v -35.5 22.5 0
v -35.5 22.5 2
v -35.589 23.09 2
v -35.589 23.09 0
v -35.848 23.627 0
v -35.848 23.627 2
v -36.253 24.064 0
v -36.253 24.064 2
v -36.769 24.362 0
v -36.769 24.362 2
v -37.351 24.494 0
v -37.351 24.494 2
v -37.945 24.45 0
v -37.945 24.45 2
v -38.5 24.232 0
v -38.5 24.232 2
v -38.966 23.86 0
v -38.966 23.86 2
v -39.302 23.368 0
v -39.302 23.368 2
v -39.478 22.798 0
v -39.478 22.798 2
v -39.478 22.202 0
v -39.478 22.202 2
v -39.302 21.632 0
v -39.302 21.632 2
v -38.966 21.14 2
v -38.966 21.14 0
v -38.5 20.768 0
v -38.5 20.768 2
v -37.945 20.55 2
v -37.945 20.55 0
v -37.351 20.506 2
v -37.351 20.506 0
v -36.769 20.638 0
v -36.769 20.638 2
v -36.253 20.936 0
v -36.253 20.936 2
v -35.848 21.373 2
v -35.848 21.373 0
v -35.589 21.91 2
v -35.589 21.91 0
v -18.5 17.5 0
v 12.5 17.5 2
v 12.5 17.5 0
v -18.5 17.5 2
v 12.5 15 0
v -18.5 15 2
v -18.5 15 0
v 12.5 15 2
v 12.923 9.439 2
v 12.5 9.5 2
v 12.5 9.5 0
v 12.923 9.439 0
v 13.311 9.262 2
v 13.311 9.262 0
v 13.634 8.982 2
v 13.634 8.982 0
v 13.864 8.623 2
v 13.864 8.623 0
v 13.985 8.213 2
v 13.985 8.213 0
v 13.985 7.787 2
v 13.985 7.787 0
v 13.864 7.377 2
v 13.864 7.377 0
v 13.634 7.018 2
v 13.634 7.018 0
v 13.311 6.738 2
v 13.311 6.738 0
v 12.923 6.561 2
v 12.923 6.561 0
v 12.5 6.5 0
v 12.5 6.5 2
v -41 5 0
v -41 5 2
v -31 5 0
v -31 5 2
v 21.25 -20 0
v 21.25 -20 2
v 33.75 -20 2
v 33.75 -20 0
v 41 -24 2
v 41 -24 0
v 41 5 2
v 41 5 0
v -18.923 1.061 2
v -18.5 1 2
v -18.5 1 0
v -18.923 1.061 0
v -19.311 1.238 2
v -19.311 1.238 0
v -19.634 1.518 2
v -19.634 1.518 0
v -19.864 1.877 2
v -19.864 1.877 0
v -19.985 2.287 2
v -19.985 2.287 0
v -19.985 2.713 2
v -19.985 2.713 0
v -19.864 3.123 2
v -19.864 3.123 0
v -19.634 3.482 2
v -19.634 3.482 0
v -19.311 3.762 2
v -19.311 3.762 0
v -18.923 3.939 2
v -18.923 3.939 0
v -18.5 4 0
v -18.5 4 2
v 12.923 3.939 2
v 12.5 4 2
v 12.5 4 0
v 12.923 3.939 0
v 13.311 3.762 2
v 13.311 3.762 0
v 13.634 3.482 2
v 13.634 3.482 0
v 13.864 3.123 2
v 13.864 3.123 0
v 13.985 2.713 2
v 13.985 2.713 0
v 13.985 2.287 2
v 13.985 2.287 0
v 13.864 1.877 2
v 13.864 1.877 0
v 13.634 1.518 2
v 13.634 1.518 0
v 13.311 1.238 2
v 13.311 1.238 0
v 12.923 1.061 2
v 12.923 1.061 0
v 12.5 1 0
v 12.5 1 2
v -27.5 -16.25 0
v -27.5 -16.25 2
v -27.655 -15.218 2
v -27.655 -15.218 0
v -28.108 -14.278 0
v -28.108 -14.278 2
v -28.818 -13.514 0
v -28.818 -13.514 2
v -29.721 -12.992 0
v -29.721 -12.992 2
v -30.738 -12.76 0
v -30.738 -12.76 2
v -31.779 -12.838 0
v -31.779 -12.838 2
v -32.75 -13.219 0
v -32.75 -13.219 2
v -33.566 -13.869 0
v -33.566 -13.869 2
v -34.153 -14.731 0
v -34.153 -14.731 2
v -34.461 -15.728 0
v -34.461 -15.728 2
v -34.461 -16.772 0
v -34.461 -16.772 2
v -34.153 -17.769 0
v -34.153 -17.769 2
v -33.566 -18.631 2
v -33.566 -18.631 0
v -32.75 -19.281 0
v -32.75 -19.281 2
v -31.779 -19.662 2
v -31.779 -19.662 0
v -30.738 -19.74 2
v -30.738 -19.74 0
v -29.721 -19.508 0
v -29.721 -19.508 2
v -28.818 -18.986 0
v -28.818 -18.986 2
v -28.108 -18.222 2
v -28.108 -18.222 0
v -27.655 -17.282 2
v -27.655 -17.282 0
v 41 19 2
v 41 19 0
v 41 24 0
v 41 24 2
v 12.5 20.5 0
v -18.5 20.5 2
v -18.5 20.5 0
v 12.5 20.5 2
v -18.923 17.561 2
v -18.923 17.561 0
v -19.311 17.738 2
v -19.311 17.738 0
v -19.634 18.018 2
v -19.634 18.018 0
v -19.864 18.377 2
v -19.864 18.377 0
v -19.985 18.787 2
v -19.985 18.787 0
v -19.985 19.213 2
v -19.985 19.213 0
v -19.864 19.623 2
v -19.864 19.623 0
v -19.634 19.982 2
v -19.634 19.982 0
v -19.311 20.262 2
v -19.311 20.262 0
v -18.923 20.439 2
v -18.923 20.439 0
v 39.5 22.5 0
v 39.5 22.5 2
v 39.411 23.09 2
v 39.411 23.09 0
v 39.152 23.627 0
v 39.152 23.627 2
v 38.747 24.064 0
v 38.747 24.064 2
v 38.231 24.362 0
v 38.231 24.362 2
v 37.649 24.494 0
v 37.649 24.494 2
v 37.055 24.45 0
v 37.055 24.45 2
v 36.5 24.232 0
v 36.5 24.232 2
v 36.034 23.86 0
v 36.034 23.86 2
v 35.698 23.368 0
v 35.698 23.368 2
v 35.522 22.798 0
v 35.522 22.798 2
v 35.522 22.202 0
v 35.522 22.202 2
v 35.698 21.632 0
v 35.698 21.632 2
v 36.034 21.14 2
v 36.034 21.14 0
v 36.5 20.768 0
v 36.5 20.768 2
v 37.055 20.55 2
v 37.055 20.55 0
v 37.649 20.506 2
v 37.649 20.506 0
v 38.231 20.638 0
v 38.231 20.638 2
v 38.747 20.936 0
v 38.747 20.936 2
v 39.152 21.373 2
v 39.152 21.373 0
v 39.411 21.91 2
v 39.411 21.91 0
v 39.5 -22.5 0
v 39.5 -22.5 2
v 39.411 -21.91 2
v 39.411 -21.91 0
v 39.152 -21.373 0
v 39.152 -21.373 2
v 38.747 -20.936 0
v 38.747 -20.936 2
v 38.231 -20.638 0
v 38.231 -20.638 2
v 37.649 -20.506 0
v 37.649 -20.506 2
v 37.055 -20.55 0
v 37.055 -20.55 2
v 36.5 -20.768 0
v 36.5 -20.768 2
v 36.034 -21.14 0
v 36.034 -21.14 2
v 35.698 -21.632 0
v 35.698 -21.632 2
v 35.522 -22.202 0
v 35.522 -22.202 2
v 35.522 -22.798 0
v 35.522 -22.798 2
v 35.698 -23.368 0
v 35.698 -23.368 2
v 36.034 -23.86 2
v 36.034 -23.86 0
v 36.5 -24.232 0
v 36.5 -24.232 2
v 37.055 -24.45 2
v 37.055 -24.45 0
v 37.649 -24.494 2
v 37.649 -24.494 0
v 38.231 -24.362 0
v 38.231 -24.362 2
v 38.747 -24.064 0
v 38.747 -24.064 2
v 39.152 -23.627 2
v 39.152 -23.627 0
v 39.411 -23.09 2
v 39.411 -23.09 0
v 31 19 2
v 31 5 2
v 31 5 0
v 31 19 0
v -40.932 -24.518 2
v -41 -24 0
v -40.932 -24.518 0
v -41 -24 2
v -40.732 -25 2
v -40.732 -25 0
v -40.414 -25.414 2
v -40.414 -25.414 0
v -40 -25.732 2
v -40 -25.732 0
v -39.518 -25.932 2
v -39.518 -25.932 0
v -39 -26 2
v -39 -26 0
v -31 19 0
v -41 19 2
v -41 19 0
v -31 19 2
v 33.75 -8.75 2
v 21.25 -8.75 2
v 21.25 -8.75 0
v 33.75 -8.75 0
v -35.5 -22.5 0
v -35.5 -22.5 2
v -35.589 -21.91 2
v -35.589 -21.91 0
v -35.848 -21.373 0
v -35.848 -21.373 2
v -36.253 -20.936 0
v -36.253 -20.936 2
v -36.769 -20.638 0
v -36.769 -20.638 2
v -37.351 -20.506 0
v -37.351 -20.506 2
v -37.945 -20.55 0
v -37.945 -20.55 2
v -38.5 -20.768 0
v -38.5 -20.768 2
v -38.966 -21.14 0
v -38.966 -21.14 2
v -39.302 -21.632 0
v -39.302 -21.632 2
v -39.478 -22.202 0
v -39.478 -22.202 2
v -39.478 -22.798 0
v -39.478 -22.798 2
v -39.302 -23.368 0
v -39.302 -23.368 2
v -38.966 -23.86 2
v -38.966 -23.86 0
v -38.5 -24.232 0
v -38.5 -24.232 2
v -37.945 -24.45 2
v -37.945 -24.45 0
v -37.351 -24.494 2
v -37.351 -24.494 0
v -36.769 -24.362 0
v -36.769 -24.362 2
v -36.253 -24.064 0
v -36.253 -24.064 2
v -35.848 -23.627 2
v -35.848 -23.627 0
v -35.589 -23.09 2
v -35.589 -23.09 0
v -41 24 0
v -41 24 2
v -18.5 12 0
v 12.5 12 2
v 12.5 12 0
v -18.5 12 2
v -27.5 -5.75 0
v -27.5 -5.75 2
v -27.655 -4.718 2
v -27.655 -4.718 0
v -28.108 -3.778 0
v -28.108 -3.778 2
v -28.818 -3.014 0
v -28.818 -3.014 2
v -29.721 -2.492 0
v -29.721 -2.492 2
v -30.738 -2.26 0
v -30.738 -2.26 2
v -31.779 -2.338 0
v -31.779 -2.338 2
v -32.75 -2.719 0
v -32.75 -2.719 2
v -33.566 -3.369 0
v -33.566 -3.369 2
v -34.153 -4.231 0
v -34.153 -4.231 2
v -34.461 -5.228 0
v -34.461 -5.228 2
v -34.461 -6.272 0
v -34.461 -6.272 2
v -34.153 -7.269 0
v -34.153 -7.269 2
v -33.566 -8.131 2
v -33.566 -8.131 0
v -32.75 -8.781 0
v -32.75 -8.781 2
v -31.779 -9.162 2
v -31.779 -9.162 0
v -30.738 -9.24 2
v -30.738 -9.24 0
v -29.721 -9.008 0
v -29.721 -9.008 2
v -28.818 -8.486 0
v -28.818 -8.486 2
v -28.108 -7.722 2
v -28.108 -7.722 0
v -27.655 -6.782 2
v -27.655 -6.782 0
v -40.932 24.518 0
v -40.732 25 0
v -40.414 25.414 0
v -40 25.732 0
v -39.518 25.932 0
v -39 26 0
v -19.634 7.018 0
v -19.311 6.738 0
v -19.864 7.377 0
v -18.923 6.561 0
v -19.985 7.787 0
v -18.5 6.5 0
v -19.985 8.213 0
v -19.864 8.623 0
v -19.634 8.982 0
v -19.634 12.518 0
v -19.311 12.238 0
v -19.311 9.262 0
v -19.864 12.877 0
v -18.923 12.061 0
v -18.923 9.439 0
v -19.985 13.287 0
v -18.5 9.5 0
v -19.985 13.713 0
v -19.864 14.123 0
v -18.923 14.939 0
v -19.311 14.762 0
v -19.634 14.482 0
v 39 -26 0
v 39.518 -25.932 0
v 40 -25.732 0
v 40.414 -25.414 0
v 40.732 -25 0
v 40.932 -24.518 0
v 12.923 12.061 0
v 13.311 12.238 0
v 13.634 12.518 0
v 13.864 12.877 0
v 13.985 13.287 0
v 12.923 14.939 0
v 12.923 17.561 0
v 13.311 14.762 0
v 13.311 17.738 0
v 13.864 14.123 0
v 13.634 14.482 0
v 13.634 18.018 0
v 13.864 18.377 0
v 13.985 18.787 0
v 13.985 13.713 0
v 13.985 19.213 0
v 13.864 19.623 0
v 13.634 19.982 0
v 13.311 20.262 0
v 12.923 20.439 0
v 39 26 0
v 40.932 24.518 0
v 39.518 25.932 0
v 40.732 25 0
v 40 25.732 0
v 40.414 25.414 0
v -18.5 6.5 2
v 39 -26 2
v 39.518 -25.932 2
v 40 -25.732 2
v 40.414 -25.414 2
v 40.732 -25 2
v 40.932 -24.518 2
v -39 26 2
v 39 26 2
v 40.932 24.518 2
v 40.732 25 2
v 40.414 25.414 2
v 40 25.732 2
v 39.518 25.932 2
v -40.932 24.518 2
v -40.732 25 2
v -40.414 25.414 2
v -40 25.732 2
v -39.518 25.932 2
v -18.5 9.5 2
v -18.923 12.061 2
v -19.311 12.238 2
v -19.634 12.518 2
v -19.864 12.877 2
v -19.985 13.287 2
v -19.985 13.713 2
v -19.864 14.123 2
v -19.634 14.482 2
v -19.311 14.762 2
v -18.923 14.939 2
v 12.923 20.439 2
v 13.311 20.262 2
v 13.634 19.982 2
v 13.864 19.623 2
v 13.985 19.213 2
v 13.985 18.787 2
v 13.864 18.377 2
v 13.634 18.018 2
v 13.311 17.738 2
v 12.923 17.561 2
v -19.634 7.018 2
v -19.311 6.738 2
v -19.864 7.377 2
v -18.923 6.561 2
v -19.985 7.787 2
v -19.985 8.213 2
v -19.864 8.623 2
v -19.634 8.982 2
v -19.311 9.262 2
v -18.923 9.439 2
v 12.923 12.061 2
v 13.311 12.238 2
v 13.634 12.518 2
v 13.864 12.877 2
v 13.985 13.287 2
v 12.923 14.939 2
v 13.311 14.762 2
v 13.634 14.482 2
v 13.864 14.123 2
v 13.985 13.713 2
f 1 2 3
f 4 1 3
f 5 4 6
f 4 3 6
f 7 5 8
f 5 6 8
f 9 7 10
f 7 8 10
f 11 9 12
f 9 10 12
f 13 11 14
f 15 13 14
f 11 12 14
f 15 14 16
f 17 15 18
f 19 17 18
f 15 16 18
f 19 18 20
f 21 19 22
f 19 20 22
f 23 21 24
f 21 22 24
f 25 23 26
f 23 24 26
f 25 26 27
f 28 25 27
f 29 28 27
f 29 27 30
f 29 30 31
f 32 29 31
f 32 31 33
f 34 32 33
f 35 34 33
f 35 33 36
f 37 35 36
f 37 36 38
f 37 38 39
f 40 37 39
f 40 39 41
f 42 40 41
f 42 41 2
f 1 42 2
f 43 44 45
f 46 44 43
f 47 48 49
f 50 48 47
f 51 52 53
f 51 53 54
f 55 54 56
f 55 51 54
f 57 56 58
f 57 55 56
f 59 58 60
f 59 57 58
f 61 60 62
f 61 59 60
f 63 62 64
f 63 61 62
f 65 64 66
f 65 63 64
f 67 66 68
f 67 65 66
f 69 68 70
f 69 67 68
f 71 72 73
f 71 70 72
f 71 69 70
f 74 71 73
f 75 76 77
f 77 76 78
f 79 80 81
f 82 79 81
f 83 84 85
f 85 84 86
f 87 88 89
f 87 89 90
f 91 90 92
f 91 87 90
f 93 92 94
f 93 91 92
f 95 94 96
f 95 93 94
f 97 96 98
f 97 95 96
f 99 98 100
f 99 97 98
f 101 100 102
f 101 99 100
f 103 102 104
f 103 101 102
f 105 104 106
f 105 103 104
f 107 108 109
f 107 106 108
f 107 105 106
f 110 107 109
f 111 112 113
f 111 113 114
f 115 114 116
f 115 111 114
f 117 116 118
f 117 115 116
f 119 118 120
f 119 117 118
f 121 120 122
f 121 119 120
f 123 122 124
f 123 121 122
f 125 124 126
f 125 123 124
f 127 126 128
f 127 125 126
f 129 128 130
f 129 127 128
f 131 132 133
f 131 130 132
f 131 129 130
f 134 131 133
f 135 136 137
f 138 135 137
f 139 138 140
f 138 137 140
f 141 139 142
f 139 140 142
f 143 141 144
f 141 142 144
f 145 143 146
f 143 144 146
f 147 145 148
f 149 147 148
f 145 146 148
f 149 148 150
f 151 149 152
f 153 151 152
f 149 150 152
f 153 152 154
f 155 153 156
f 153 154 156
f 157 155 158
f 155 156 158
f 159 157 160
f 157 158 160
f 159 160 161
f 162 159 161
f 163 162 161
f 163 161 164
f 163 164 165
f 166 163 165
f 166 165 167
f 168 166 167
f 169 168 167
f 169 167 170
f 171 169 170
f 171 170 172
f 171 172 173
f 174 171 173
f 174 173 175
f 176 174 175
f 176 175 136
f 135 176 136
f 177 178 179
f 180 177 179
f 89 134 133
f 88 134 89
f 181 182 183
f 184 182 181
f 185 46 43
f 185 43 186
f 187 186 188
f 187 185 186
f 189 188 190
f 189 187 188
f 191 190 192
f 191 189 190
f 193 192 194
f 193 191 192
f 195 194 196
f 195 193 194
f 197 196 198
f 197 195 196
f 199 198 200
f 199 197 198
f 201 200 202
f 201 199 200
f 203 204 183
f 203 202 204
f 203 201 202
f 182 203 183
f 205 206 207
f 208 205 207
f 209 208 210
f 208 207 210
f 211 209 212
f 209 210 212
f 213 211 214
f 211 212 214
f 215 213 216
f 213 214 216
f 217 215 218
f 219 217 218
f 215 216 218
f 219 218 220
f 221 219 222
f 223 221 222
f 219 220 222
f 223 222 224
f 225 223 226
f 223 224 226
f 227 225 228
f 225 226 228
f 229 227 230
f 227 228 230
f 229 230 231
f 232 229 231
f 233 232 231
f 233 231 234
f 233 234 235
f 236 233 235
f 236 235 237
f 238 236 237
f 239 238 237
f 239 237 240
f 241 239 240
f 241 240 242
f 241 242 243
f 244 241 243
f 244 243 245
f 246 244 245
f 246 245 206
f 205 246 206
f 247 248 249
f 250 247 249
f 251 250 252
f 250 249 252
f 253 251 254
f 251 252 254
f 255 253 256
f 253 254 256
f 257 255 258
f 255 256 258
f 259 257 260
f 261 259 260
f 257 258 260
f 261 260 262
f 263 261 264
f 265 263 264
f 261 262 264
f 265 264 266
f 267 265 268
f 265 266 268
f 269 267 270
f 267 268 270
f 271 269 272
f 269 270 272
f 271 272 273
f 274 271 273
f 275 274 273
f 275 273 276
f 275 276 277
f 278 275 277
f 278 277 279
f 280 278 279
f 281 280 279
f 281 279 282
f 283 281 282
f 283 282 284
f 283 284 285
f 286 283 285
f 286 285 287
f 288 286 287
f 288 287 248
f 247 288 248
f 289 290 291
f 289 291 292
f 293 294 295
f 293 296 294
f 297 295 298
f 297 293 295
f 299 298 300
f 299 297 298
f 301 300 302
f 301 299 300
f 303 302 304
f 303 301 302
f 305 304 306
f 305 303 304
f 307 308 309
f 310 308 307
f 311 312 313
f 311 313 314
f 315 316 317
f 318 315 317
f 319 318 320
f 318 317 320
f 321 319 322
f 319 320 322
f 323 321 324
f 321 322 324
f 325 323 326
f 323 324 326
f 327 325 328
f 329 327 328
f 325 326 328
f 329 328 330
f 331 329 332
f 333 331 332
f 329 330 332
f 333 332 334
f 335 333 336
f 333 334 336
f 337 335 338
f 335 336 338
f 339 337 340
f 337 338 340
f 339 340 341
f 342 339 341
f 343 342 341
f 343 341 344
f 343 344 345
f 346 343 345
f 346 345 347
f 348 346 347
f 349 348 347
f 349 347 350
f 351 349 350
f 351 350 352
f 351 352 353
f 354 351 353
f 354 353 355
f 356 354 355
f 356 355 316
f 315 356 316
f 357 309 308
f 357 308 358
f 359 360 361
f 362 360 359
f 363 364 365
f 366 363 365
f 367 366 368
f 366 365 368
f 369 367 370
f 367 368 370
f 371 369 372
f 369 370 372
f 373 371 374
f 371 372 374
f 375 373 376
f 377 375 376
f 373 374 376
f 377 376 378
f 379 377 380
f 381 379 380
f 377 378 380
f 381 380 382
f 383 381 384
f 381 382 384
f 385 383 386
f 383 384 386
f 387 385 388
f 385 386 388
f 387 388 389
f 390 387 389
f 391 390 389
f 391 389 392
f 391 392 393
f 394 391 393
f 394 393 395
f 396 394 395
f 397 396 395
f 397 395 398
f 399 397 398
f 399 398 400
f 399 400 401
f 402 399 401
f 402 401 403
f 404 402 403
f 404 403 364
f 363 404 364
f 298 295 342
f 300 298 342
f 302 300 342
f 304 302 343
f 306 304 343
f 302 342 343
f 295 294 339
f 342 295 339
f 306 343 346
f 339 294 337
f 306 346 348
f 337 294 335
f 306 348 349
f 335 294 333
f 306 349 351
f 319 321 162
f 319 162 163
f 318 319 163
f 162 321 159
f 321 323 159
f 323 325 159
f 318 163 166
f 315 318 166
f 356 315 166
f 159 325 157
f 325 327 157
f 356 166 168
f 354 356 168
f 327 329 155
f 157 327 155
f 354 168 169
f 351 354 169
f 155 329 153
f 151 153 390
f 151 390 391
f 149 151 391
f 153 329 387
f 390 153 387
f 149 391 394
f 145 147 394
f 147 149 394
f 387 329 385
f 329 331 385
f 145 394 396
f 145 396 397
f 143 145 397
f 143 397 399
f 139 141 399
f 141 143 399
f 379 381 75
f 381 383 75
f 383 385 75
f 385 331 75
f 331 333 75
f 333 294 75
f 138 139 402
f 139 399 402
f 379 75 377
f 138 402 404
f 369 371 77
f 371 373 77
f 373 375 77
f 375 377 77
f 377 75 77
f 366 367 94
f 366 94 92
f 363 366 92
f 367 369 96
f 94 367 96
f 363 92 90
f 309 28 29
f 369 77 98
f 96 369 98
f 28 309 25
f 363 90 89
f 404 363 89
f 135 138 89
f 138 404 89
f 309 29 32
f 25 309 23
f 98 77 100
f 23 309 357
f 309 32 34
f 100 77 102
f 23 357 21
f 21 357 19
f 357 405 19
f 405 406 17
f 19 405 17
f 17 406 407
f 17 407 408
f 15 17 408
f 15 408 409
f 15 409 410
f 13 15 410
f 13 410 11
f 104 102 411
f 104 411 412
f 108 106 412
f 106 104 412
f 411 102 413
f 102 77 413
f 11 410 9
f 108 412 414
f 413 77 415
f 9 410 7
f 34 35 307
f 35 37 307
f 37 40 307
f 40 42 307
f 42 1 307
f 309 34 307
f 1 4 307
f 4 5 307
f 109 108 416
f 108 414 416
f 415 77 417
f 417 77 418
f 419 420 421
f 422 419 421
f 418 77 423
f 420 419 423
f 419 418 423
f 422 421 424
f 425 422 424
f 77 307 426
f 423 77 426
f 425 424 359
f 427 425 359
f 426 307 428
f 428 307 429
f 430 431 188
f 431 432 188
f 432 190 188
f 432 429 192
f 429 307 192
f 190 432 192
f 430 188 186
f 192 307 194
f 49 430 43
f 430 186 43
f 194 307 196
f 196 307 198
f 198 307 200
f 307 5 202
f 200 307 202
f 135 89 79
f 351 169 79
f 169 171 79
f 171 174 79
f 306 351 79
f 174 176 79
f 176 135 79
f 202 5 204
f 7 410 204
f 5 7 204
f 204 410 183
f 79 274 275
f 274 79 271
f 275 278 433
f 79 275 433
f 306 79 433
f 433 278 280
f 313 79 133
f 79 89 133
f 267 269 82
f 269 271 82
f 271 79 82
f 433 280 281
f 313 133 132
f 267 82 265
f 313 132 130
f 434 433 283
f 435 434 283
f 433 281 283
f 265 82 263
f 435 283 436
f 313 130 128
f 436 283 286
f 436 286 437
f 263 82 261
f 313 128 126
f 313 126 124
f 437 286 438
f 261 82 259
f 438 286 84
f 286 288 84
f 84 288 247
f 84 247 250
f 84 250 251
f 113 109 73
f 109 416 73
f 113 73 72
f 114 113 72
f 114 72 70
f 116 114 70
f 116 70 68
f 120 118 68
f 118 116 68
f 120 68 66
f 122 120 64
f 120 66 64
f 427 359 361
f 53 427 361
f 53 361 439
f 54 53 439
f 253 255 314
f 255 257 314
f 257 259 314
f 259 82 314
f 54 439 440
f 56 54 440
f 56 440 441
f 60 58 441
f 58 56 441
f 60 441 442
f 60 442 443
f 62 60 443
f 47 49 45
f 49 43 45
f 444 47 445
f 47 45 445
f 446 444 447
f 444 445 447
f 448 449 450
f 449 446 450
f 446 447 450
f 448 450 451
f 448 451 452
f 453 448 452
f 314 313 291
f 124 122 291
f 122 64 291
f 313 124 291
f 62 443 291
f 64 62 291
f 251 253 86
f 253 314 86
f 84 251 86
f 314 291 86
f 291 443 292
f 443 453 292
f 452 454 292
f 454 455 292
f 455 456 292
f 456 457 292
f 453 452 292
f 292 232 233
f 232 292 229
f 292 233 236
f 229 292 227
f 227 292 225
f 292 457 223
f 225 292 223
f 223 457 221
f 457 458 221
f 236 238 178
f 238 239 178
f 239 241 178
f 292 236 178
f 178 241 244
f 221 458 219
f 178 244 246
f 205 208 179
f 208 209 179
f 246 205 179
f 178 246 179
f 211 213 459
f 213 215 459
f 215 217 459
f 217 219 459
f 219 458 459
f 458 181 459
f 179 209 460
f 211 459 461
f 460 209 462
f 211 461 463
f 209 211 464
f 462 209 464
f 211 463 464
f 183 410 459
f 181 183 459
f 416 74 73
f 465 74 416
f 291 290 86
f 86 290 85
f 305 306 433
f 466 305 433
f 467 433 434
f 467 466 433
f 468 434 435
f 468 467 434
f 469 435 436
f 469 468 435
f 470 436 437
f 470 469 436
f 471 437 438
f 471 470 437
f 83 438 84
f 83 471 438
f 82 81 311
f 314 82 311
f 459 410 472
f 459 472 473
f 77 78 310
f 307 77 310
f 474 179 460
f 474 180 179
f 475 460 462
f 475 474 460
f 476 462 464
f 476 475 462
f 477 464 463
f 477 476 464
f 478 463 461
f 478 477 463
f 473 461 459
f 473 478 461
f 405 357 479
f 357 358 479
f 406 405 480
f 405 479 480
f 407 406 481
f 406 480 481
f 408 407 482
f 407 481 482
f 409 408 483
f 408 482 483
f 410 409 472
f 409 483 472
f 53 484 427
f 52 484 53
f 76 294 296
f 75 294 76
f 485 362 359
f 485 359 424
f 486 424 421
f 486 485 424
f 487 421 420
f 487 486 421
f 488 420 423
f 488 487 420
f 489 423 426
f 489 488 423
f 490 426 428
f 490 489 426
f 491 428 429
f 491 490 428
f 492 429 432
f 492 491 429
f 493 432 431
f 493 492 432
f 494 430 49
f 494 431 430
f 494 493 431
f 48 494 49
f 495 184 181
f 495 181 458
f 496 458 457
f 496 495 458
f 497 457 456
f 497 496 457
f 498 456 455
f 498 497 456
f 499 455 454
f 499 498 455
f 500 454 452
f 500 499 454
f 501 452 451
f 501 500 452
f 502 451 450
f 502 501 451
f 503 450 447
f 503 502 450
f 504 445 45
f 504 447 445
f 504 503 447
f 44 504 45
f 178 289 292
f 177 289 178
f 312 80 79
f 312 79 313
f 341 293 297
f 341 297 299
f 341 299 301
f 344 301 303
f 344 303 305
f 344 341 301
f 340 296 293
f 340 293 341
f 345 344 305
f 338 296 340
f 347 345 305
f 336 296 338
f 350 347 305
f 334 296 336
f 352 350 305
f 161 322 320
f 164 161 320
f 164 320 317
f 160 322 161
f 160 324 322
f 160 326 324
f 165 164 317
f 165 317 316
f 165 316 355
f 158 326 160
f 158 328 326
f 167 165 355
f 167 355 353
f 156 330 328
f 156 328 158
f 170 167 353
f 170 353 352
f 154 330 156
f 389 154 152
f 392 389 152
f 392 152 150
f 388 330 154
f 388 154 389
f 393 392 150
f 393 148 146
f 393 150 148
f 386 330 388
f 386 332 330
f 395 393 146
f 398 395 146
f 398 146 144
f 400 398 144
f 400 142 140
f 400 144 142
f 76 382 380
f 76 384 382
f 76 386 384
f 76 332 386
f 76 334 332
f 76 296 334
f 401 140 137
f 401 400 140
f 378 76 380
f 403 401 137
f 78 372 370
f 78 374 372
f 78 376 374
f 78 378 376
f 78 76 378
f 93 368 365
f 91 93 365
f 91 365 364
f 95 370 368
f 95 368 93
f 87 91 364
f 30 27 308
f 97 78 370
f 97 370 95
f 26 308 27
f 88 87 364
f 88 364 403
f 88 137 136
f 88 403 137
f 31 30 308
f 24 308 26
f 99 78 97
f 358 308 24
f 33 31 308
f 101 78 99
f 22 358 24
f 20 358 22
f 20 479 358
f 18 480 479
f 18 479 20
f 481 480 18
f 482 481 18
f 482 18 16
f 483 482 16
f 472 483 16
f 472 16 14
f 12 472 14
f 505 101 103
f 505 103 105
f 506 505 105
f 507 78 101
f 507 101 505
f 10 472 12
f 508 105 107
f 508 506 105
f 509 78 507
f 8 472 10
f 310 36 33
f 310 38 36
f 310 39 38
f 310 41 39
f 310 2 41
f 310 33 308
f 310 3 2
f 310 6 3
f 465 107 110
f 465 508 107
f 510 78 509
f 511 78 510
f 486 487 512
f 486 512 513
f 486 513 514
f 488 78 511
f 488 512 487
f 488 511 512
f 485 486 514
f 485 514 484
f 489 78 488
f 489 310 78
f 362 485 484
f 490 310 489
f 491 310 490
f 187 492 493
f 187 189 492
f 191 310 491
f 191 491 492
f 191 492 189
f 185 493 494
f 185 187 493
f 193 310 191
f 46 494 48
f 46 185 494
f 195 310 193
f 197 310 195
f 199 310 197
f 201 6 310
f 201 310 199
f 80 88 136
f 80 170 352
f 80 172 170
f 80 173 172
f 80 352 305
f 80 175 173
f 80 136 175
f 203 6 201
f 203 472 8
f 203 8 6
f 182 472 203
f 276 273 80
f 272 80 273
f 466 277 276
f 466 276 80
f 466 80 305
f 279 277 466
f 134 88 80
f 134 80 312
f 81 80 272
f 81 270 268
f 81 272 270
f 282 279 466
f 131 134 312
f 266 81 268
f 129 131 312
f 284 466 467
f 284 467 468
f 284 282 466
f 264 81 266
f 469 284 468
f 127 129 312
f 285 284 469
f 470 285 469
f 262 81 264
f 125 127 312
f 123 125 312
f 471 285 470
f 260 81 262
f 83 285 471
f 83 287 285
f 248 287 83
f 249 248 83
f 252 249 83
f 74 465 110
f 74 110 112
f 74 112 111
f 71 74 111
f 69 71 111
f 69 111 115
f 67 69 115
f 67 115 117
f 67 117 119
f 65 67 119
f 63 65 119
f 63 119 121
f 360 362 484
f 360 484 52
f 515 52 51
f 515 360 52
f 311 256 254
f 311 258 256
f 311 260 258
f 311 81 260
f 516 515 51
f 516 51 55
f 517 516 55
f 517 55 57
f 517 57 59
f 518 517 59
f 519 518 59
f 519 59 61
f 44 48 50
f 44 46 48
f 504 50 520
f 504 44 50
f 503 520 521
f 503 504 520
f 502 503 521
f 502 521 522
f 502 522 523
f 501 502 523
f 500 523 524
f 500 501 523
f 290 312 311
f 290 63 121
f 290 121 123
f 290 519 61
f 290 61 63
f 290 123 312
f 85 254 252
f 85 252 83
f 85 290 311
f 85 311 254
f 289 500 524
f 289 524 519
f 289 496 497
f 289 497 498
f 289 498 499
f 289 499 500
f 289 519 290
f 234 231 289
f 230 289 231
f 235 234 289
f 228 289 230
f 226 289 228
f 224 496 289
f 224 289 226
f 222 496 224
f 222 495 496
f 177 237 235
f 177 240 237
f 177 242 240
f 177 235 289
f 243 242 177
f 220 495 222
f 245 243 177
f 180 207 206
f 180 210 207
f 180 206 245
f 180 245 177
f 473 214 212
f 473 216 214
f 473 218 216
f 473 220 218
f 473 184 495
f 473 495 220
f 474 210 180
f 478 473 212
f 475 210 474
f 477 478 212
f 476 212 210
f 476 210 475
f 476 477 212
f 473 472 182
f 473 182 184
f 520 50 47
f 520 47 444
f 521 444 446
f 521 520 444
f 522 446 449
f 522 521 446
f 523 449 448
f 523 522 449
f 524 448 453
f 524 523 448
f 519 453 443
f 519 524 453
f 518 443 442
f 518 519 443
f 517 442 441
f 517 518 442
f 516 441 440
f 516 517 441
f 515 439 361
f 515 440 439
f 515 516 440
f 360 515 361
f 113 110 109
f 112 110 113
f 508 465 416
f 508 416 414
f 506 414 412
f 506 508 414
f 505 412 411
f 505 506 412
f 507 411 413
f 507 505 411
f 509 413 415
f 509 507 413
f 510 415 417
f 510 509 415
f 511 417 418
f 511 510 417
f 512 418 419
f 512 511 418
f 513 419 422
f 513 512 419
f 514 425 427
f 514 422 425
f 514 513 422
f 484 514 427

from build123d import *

# Parameters (mm, degrees)
SKETCH1_W           = 82
SKETCH1_H           = 52
BOSS_EXTRUDE1_DEPTH = 2
FILLET1_R           = 2
CUT_EXTRUDE1_DEPTH  = 49.590122453
SKETCH3_R           = 2
CUT_EXTRUDE2_DEPTH  = 49.590122453
SKETCH4_R           = 3.5
SKETCH4_W           = 10
SKETCH4_H           = 14
SKETCH4_W_2         = 12.5
SKETCH4_H_2         = 11.25
CUT_EXTRUDE3_DEPTH  = 49.590122453


with BuildPart() as part:
    # Sketch1 → Boss-Extrude1 (new body)
    with BuildSketch(Plane.XY):
        Rectangle(SKETCH1_W, SKETCH1_H)
    extrude(amount=BOSS_EXTRUDE1_DEPTH)

    # Fillet1
    fillet1_edges = [part.edges().sort_by_distance(p)[0] for p in [
        (-41, 26, 1),
        (41, 26, 1),
        (41, -26, 1),
        (-41, -26, 1),
    ]]
    fillet(fillet1_edges, radius=FILLET1_R)

    # Sketch2 → Cut-Extrude1 (cut, through all)
    with BuildSketch(Plane.XY.offset(2)):
        with BuildLine():
            Line((-18.5, 20.5), (12.5, 20.5))
            ThreePointArc((12.5, 20.5), (14, 19), (12.5, 17.5))
            Line((12.5, 17.5), (-18.5, 17.5))
            ThreePointArc((-18.5, 17.5), (-20, 19), (-18.5, 20.5))
        make_face()
        with BuildLine():
            Line((-18.5, 15), (12.5, 15))
            ThreePointArc((12.5, 15), (14, 13.5), (12.5, 12))
            Line((12.5, 12), (-18.5, 12))
            ThreePointArc((-18.5, 12), (-20, 13.5), (-18.5, 15))
        make_face()
        with BuildLine():
            Line((-18.5, 9.5), (12.5, 9.5))
            ThreePointArc((12.5, 9.5), (14, 8), (12.5, 6.5))
            Line((12.5, 6.5), (-18.5, 6.5))
            ThreePointArc((-18.5, 6.5), (-20, 8), (-18.5, 9.5))
        make_face()
        with BuildLine():
            Line((-18.5, 4), (12.5, 4))
            ThreePointArc((12.5, 4), (14, 2.5), (12.5, 1))
            Line((12.5, 1), (-18.5, 1))
            ThreePointArc((-18.5, 1), (-20, 2.5), (-18.5, 4))
        make_face()
    extrude(amount=-CUT_EXTRUDE1_DEPTH, mode=Mode.SUBTRACT)

    # Sketch3 → Cut-Extrude2 (cut, through all)
    with BuildSketch(Plane.XY.offset(2)):
        with Locations((37.5, 22.5)):
            Circle(SKETCH3_R)
        with Locations((-37.5, 22.5)):
            Circle(SKETCH3_R)
        with Locations((37.5, -22.5)):
            Circle(SKETCH3_R)
        with Locations((-37.5, -22.5)):
            Circle(SKETCH3_R)
    extrude(amount=-CUT_EXTRUDE2_DEPTH, mode=Mode.SUBTRACT)

    # Sketch4 → Cut-Extrude3 (cut, through all)
    with BuildSketch(Plane.XY.offset(2)):
        with Locations((-31, -5.75)):
            Circle(SKETCH4_R)
        with Locations((-31, -16.25)):
            Circle(SKETCH4_R)
        with Locations((-36, 12)):
            Rectangle(SKETCH4_W, SKETCH4_H)
        with Locations((36, 12)):
            Rectangle(SKETCH4_W, SKETCH4_H)
        with Locations((27.5, -14.375)):
            Rectangle(SKETCH4_W_2, SKETCH4_H_2)
    extrude(amount=-CUT_EXTRUDE3_DEPTH, mode=Mode.SUBTRACT)


solid = part.part
